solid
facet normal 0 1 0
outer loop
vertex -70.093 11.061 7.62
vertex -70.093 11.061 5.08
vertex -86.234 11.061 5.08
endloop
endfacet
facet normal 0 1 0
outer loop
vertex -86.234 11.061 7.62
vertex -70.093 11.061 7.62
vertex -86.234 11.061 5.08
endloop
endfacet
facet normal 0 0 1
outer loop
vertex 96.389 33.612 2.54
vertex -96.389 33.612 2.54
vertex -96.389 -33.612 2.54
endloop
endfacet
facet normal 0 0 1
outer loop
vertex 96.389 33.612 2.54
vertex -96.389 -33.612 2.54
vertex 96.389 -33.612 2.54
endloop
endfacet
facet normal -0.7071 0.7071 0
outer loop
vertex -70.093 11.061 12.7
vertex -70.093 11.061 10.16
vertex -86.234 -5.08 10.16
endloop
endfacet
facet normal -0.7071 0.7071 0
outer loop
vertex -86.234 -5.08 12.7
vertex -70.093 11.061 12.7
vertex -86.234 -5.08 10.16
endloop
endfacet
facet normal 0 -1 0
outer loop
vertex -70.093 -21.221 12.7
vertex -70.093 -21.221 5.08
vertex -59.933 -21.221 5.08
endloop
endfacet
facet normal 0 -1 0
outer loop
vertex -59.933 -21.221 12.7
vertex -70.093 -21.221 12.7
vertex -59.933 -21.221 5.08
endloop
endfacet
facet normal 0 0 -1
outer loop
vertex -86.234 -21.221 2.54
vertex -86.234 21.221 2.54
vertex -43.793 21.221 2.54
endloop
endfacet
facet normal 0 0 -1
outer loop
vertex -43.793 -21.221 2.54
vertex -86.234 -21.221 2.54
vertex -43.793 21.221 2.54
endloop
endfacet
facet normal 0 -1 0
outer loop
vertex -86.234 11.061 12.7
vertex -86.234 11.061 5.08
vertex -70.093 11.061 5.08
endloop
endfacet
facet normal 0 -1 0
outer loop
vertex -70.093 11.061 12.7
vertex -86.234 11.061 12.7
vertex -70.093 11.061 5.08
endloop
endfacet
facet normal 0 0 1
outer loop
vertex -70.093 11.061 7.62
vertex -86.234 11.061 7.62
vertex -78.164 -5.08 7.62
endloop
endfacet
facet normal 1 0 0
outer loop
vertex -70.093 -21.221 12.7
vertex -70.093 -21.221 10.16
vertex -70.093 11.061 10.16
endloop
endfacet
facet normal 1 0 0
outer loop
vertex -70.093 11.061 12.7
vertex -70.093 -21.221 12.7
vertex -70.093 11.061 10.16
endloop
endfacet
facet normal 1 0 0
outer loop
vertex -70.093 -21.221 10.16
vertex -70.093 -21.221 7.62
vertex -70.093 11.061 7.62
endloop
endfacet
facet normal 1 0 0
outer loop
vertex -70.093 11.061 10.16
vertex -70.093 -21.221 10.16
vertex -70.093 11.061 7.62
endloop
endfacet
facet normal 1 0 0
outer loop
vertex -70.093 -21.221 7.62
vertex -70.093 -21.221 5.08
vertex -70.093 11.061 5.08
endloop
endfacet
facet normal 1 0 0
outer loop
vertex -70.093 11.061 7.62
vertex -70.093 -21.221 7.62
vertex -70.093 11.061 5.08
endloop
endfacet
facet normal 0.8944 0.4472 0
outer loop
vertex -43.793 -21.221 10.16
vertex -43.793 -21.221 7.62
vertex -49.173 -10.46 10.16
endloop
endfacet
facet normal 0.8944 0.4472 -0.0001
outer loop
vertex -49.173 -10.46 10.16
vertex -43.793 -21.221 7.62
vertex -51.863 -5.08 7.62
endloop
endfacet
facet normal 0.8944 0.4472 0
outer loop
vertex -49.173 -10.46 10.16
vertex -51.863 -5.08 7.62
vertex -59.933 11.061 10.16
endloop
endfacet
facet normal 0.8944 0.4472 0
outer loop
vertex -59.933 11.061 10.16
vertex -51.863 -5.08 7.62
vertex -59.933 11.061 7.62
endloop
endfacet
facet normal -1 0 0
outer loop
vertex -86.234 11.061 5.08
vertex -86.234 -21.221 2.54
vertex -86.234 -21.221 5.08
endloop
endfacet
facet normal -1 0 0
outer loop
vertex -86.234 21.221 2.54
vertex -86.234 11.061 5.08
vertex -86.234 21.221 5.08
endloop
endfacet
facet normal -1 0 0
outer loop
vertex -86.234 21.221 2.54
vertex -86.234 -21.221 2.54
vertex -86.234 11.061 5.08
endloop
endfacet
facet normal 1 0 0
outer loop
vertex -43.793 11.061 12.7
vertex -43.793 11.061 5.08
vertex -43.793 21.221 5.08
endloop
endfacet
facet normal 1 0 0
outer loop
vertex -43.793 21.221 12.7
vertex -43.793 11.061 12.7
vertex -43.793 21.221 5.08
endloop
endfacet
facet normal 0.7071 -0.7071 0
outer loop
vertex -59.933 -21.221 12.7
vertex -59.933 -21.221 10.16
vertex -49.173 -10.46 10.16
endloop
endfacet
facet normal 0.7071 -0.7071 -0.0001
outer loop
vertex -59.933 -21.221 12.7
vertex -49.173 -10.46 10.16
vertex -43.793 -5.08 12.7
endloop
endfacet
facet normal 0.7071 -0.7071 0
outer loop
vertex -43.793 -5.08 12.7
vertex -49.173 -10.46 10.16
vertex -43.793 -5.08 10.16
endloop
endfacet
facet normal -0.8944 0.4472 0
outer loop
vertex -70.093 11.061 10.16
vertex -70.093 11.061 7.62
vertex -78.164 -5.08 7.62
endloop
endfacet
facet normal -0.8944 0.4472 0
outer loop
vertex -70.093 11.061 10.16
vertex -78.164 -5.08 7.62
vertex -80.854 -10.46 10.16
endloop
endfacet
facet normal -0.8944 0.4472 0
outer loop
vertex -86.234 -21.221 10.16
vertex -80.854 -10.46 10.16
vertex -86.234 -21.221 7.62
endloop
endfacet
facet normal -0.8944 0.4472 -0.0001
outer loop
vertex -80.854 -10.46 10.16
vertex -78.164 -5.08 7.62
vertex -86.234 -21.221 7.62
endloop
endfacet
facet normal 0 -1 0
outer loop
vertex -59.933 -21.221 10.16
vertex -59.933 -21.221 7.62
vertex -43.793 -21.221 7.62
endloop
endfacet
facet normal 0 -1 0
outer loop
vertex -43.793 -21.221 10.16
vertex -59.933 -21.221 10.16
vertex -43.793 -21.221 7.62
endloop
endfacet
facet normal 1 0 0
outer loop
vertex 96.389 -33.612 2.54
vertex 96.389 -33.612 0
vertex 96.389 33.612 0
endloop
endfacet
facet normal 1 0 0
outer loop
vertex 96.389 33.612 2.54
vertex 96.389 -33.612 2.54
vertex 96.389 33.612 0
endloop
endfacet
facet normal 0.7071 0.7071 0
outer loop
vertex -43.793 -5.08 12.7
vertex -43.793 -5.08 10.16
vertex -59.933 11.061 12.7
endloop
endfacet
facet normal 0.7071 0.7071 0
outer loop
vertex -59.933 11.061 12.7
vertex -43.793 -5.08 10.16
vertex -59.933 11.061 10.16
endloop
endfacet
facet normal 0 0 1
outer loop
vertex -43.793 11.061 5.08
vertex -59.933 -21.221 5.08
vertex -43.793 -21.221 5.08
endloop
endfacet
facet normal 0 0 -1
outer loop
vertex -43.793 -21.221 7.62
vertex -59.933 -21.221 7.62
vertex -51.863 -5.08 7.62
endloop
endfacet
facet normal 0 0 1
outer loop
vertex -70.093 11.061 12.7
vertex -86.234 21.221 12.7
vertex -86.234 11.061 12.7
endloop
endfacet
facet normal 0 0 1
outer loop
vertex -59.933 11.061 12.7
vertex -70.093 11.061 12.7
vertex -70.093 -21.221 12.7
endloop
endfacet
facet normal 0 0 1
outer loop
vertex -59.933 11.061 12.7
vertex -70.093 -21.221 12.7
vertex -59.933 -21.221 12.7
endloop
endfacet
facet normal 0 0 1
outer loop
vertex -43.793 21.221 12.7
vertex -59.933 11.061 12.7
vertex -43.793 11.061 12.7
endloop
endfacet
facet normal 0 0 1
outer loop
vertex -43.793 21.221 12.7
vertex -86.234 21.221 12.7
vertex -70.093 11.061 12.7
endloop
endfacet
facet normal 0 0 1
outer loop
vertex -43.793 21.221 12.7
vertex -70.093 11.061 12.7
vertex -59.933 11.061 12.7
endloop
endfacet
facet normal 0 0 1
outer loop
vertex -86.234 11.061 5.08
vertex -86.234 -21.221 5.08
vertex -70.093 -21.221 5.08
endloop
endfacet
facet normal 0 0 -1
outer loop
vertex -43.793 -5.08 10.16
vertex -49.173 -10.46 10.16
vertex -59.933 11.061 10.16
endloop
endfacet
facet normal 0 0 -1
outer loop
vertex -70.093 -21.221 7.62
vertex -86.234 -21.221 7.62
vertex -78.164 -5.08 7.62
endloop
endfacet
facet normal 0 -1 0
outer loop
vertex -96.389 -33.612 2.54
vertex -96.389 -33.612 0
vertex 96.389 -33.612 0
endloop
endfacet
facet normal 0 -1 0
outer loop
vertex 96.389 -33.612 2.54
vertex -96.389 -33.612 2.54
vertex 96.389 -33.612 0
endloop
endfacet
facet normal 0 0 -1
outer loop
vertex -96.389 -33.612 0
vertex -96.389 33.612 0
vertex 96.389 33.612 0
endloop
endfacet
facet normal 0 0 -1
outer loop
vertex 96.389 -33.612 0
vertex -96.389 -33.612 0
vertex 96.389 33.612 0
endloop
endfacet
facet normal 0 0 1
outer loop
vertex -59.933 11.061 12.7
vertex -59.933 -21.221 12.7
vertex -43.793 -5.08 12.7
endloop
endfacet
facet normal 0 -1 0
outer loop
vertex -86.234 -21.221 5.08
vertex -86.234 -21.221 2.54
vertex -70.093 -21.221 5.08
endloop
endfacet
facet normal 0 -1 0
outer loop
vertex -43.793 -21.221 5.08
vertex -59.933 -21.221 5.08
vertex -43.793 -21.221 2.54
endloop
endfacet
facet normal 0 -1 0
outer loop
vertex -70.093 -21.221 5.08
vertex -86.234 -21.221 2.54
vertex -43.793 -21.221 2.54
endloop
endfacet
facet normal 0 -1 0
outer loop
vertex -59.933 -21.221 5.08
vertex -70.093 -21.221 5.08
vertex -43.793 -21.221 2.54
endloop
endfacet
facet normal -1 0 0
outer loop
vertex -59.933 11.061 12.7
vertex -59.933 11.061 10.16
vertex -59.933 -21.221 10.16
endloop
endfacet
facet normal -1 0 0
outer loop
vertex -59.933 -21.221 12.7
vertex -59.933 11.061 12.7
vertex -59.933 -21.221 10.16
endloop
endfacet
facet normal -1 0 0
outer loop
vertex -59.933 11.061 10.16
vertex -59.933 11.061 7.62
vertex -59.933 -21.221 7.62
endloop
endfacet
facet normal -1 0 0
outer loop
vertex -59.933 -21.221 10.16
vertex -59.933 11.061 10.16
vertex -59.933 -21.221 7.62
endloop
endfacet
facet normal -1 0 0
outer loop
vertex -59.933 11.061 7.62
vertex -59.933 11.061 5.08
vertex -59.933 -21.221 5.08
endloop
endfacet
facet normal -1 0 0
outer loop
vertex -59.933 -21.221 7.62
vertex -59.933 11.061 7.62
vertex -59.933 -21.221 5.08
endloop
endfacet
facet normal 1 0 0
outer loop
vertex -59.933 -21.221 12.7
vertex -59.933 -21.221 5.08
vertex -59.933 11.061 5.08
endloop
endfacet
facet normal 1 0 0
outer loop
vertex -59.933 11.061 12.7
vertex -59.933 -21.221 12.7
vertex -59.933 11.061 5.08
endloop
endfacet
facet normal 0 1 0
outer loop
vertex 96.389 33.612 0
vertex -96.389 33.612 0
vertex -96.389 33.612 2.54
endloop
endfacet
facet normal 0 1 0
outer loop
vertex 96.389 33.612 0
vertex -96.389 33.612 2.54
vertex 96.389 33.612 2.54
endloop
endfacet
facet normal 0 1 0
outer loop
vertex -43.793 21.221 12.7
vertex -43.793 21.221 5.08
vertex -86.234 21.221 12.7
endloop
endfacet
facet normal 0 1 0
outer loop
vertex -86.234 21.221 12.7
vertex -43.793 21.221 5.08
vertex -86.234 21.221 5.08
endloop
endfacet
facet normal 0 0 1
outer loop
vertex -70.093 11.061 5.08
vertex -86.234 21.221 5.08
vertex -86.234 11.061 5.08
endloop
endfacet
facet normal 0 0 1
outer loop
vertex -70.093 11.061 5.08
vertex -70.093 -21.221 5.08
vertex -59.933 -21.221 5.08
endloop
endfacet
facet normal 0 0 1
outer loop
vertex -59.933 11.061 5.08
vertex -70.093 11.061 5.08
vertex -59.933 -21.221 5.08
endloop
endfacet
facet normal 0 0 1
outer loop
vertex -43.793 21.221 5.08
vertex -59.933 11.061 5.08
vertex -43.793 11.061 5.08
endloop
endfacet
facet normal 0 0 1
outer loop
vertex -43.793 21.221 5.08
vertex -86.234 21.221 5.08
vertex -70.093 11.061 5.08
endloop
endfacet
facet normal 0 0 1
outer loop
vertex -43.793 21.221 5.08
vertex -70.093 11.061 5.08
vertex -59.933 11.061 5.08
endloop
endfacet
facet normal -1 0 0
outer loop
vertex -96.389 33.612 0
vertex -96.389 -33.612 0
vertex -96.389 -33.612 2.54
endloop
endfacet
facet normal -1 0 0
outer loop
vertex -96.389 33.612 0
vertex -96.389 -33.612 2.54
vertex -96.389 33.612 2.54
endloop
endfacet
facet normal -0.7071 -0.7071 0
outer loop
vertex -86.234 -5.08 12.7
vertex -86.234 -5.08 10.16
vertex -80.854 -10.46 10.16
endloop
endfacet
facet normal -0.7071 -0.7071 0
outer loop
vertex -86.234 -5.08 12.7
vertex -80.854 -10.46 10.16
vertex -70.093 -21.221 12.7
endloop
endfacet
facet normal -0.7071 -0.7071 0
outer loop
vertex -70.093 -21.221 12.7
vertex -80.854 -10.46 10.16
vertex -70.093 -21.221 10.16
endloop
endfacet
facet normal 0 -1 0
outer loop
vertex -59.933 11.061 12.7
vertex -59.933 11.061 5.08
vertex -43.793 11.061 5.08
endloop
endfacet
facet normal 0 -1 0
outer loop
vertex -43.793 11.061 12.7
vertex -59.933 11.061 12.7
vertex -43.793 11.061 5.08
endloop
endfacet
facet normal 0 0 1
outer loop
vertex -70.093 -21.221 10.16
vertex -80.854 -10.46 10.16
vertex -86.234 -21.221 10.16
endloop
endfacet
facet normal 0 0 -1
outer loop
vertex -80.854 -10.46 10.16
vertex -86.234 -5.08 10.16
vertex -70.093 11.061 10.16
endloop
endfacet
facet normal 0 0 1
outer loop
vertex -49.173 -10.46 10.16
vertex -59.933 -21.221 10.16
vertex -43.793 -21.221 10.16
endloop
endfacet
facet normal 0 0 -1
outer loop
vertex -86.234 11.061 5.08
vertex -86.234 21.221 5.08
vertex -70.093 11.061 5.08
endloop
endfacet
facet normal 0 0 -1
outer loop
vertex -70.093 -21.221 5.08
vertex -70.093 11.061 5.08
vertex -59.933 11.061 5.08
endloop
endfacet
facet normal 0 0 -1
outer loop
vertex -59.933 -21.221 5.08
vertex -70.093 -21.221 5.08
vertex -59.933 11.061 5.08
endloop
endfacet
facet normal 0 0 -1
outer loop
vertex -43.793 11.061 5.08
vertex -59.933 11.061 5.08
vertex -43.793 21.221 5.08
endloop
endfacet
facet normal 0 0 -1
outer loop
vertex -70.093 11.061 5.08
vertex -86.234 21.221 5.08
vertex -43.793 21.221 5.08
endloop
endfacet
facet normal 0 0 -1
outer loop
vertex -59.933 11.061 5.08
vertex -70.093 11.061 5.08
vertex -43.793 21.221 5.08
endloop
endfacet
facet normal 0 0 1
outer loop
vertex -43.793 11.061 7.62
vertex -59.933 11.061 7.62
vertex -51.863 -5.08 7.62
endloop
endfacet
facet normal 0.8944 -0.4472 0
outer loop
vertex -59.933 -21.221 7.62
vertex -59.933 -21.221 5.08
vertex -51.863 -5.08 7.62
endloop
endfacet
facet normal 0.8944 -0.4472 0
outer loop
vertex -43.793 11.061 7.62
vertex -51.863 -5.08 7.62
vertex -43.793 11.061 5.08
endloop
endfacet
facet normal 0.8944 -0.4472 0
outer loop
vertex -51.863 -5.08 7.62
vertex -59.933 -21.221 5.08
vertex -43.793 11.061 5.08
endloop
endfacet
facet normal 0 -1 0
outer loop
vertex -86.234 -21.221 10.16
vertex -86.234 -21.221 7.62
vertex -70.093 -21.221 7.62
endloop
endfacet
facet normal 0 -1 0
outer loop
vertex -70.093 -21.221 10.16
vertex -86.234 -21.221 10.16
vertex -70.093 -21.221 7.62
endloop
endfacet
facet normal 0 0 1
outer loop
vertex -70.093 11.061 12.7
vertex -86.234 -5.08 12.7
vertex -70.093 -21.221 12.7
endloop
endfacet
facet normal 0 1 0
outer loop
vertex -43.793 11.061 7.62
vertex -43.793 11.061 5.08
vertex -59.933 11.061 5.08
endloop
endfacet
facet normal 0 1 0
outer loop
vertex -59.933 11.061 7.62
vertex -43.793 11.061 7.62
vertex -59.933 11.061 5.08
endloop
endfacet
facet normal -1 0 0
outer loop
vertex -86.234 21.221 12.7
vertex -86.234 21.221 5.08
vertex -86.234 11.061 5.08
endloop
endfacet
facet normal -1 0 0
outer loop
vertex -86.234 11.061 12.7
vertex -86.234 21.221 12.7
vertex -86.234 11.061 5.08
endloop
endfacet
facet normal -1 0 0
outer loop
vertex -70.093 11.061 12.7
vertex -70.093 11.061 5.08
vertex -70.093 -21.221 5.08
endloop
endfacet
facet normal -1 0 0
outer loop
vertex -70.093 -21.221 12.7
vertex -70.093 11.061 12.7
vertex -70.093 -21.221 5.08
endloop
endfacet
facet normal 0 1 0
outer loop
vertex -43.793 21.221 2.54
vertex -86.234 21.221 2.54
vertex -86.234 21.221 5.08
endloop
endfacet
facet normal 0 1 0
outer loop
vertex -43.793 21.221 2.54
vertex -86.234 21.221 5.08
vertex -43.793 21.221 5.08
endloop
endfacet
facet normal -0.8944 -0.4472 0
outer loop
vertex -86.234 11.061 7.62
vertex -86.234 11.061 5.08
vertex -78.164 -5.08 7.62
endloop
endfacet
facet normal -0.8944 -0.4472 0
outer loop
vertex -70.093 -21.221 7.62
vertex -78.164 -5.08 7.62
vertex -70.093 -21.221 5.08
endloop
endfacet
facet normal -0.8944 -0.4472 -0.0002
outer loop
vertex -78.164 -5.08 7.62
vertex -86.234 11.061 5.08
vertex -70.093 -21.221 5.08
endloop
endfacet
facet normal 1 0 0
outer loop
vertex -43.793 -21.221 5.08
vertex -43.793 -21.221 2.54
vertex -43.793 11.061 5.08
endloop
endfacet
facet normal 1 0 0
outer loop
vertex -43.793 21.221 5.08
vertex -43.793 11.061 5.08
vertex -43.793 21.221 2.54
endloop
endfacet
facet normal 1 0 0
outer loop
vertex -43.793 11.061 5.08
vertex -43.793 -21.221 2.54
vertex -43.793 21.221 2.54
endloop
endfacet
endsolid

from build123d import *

# Parameters (mm, degrees)
F0_W      = 192.7787214518
F0_H      = 67.2237873077
F1_DEPTH  = 2.54
F2_W      = 42.4414947629
F2_H      = 42.4414947629
F3_DEPTH  = 2.54
F5_DEPTH  = 7.62
F7_DEPTH  = 2.54
F9_DEPTH  = 2.54
F11_DEPTH = 2.54


# Not quite as in the source:
# - a feature names something its author has since deleted; it is built from what else it names


with BuildPart() as f1:
    # F0 (on Top) → F1 (new body)
    with BuildSketch(Plane.XY):
        Rectangle(F0_W, F0_H)
    extrude(amount=F1_DEPTH)


with BuildPart() as f3:
    # F2 (on face) → F3 (new body)
    with BuildSketch(Plane.XY.offset(2.54)):
        with Locations((-65.0134757161, 0)):
            Rectangle(F2_W, F2_H)
    extrude(amount=F3_DEPTH)

    # F6 (on face) → F7 (join)
    with BuildSketch(Plane.XY.offset(5.08)):
        Polygon((-70.0934757161, 11.0607473814), (-86.2342230976, 11.0607473814), (-70.0934757161, -21.2207473814), align=None)
        Polygon((-59.9334757161, 11.0607473814), (-59.9334757161, -21.2207473814), (-43.7927283347, 11.0607473814), align=None)
    extrude(amount=F7_DEPTH)

    # F8 (on face) → F9 (join)
    with BuildSketch(Plane.XY.offset(7.62)):
        Polygon((-86.2342230976, -21.2207473814), (-70.0934757161, -21.2207473814), (-70.0934757161, 11.0607473814), align=None)
        Polygon((-59.9334757161, 11.0607473814), (-59.9334757161, -21.2207473814), (-43.7927283347, -21.2207473814), align=None)
    extrude(amount=F9_DEPTH)

    # F10 (on face) → F11 (join)
    with BuildSketch(Plane.XY.offset(10.16)):
        Polygon((-70.0934757161, -21.2207473814), (-70.0934757161, 11.0607473814), (-86.2342230976, -5.08), align=None)
        Polygon((-59.9334757161, 11.0607473814), (-59.9334757161, -21.2207473814), (-43.7927283347, -5.08), align=None)
    extrude(amount=F11_DEPTH)


with BuildPart() as f5:
    # F4 (on face) → F5 (new body)
    with BuildSketch(Plane.XY.offset(5.08)):
        Polygon((-43.7927283347, 21.2207473814), (-86.2342230976, 21.2207473814), (-86.2342230976, 11.0607473814), (-70.0934757161, 11.0607473814), (-70.0934757161, -21.2207473814), (-59.9334757161, -21.2207473814), (-59.9334757161, 11.0607473814), (-43.7927283347, 11.0607473814), align=None)
    extrude(amount=F5_DEPTH)


solid = Compound([f1.part, f3.part, f5.part])
